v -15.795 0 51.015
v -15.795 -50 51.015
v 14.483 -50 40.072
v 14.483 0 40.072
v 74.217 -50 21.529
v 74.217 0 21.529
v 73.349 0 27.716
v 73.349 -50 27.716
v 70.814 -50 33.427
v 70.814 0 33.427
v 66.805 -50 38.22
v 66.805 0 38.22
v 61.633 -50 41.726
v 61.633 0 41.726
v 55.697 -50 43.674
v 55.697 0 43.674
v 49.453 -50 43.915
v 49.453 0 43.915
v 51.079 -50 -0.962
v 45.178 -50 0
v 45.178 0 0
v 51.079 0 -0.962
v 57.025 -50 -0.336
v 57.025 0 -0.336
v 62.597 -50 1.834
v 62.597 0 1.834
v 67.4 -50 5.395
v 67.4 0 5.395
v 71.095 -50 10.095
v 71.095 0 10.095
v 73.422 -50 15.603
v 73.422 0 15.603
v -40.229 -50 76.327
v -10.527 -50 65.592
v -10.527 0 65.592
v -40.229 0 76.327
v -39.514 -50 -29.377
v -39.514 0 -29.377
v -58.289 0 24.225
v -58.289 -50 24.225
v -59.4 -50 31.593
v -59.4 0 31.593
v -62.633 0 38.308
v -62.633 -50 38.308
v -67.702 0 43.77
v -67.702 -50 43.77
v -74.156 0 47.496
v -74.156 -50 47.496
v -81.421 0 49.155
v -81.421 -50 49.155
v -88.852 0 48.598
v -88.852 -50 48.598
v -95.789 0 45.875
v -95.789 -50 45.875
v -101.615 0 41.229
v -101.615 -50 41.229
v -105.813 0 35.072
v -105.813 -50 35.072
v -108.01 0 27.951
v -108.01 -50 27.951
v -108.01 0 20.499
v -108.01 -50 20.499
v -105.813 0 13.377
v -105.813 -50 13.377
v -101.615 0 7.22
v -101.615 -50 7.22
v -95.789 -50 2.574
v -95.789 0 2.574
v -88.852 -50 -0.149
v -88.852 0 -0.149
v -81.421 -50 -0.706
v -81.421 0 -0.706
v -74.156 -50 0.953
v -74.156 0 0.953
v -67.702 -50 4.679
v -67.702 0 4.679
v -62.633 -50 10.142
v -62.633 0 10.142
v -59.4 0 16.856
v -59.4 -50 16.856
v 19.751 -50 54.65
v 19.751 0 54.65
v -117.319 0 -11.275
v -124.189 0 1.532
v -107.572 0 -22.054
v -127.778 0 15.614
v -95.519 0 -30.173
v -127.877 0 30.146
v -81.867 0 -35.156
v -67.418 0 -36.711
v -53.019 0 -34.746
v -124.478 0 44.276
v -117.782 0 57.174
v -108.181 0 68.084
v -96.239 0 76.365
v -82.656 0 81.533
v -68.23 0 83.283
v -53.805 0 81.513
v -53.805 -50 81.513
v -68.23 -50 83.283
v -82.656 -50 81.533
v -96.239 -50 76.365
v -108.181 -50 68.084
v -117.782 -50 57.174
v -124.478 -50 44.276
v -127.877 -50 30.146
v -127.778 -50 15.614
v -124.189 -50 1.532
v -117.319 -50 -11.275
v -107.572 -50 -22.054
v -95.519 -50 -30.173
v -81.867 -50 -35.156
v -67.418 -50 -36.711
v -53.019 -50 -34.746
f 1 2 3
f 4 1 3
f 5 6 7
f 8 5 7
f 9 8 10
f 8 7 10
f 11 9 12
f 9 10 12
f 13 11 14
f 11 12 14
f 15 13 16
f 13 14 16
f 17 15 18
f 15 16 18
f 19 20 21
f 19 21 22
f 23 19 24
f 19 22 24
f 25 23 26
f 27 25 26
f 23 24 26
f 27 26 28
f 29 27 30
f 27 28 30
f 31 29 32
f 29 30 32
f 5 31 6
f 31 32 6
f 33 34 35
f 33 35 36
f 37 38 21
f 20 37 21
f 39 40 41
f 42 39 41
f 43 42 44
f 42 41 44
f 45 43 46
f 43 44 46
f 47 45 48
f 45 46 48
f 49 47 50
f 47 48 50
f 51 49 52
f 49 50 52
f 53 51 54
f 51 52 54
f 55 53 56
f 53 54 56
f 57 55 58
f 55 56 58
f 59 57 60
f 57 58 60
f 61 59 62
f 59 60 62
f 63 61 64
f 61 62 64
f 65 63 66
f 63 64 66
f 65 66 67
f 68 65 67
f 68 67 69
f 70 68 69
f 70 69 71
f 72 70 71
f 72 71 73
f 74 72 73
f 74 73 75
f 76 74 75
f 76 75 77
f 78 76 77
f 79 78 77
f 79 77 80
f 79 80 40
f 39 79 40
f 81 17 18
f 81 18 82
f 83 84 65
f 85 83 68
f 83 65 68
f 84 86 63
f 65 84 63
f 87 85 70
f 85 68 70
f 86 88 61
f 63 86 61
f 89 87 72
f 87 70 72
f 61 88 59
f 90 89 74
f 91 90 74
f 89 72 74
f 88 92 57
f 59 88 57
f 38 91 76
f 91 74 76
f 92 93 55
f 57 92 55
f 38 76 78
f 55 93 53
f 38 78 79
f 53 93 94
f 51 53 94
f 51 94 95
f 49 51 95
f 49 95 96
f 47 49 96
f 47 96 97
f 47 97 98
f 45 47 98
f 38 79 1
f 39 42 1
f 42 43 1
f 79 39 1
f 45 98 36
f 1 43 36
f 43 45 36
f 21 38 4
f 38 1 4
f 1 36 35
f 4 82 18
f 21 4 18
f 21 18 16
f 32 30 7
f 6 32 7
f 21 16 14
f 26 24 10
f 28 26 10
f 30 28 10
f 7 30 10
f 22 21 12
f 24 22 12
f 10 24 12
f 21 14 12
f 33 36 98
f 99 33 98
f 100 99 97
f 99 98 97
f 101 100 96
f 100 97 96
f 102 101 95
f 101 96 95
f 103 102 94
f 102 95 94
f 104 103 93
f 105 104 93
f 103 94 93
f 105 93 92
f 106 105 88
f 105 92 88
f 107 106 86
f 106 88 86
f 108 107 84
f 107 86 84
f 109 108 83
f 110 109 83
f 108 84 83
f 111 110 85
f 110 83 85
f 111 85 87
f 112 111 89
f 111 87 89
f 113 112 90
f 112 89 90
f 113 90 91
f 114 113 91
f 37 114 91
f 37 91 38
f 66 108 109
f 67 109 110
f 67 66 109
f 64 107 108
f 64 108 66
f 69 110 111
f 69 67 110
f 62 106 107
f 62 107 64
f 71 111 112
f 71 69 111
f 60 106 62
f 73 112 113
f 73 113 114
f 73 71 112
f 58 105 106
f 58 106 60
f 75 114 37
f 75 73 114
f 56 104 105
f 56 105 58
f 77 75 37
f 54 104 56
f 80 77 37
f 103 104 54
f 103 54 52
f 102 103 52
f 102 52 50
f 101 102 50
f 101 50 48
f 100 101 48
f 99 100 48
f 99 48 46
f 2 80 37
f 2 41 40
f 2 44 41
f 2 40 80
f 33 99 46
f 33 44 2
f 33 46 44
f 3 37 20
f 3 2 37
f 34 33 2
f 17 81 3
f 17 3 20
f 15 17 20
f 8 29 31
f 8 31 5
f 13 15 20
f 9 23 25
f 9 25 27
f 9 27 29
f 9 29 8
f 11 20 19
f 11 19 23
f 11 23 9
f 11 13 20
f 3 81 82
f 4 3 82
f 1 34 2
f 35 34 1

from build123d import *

# Parameters (mm, degrees)
F1_DEPTH = 50
F2_W     = 32.1948009557
F2_H     = 50
F3_DEPTH = 15.5
F4_R     = 25
F5_DEPTH = 50.001


with BuildPart() as f1:
    # F0 (on Front) → F1 (new body)
    with BuildSketch(Plane.XZ):
        with BuildLine():
            ThreePointArc((-39.5141846856, -29.3770225464), (-16.6691602535, -7.3325556277), (-8.2703797283, 23.2830310679))
            ThreePointArc((-8.2703797283, 23.2830310679), (-16.8774367266, 54.2469683115), (-40.2292267158, 76.3272931302))
            ThreePointArc((-40.2292267158, 76.3272931302), (-128.2690070017, 22.8771674096), (-39.5141846856, -29.3770225464))
        make_face()
        with BuildLine():
            ThreePointArc((-40.2292267158, 76.3272931302), (-16.8774367266, 54.2469683115), (-8.2703797283, 23.2830310679))
            ThreePointArc((-8.2703797283, 23.2830310679), (-16.6691602535, -7.3325556277), (-39.5141846856, -29.3770225464))
            Line((-39.5141846856, -29.3770225464), (45.1779214949, 0))
            ThreePointArc((45.1779214949, 0), (29.3226828607, 23.709159184), (49.4534202451, 43.9147582526))
            Line((49.4534202451, 43.9147582526), (-40.2292267158, 76.3272931302))
        make_face()
        with BuildLine():
            ThreePointArc((74.2167987014, 21.5288895412), (66.8052708694, 38.2198454046), (49.4534202451, 43.9147582526))
            ThreePointArc((49.4534202451, 43.9147582526), (29.3226828607, 23.709159184), (45.1779214949, 0))
            ThreePointArc((45.1779214949, 0), (65.1168968886, 3.454394567), (74.2167987014, 21.5288895412))
        make_face()
    extrude(amount=F1_DEPTH)

    # F2 (on face) → F3 (cut)
    with BuildSketch(Plane(origin=(19.7511057602, 0, 54.6495808388), x_dir=(0.9404629658, 0, -0.3398961752), z_dir=(0.3398961752, 0, 0.9404629658))):
        with Locations((-16.0974004779, -25)):
            Rectangle(F2_W, F2_H)
    extrude(amount=-F3_DEPTH, mode=Mode.SUBTRACT)

    # F4 (on face) → F5 (cut, through all)
    with BuildSketch(Plane.XZ.offset(50)):
        with Locations((-83.2891840334, 24.2245818774)):
            Circle(F4_R)
    extrude(amount=-F5_DEPTH, mode=Mode.SUBTRACT)


solid = f1.part
